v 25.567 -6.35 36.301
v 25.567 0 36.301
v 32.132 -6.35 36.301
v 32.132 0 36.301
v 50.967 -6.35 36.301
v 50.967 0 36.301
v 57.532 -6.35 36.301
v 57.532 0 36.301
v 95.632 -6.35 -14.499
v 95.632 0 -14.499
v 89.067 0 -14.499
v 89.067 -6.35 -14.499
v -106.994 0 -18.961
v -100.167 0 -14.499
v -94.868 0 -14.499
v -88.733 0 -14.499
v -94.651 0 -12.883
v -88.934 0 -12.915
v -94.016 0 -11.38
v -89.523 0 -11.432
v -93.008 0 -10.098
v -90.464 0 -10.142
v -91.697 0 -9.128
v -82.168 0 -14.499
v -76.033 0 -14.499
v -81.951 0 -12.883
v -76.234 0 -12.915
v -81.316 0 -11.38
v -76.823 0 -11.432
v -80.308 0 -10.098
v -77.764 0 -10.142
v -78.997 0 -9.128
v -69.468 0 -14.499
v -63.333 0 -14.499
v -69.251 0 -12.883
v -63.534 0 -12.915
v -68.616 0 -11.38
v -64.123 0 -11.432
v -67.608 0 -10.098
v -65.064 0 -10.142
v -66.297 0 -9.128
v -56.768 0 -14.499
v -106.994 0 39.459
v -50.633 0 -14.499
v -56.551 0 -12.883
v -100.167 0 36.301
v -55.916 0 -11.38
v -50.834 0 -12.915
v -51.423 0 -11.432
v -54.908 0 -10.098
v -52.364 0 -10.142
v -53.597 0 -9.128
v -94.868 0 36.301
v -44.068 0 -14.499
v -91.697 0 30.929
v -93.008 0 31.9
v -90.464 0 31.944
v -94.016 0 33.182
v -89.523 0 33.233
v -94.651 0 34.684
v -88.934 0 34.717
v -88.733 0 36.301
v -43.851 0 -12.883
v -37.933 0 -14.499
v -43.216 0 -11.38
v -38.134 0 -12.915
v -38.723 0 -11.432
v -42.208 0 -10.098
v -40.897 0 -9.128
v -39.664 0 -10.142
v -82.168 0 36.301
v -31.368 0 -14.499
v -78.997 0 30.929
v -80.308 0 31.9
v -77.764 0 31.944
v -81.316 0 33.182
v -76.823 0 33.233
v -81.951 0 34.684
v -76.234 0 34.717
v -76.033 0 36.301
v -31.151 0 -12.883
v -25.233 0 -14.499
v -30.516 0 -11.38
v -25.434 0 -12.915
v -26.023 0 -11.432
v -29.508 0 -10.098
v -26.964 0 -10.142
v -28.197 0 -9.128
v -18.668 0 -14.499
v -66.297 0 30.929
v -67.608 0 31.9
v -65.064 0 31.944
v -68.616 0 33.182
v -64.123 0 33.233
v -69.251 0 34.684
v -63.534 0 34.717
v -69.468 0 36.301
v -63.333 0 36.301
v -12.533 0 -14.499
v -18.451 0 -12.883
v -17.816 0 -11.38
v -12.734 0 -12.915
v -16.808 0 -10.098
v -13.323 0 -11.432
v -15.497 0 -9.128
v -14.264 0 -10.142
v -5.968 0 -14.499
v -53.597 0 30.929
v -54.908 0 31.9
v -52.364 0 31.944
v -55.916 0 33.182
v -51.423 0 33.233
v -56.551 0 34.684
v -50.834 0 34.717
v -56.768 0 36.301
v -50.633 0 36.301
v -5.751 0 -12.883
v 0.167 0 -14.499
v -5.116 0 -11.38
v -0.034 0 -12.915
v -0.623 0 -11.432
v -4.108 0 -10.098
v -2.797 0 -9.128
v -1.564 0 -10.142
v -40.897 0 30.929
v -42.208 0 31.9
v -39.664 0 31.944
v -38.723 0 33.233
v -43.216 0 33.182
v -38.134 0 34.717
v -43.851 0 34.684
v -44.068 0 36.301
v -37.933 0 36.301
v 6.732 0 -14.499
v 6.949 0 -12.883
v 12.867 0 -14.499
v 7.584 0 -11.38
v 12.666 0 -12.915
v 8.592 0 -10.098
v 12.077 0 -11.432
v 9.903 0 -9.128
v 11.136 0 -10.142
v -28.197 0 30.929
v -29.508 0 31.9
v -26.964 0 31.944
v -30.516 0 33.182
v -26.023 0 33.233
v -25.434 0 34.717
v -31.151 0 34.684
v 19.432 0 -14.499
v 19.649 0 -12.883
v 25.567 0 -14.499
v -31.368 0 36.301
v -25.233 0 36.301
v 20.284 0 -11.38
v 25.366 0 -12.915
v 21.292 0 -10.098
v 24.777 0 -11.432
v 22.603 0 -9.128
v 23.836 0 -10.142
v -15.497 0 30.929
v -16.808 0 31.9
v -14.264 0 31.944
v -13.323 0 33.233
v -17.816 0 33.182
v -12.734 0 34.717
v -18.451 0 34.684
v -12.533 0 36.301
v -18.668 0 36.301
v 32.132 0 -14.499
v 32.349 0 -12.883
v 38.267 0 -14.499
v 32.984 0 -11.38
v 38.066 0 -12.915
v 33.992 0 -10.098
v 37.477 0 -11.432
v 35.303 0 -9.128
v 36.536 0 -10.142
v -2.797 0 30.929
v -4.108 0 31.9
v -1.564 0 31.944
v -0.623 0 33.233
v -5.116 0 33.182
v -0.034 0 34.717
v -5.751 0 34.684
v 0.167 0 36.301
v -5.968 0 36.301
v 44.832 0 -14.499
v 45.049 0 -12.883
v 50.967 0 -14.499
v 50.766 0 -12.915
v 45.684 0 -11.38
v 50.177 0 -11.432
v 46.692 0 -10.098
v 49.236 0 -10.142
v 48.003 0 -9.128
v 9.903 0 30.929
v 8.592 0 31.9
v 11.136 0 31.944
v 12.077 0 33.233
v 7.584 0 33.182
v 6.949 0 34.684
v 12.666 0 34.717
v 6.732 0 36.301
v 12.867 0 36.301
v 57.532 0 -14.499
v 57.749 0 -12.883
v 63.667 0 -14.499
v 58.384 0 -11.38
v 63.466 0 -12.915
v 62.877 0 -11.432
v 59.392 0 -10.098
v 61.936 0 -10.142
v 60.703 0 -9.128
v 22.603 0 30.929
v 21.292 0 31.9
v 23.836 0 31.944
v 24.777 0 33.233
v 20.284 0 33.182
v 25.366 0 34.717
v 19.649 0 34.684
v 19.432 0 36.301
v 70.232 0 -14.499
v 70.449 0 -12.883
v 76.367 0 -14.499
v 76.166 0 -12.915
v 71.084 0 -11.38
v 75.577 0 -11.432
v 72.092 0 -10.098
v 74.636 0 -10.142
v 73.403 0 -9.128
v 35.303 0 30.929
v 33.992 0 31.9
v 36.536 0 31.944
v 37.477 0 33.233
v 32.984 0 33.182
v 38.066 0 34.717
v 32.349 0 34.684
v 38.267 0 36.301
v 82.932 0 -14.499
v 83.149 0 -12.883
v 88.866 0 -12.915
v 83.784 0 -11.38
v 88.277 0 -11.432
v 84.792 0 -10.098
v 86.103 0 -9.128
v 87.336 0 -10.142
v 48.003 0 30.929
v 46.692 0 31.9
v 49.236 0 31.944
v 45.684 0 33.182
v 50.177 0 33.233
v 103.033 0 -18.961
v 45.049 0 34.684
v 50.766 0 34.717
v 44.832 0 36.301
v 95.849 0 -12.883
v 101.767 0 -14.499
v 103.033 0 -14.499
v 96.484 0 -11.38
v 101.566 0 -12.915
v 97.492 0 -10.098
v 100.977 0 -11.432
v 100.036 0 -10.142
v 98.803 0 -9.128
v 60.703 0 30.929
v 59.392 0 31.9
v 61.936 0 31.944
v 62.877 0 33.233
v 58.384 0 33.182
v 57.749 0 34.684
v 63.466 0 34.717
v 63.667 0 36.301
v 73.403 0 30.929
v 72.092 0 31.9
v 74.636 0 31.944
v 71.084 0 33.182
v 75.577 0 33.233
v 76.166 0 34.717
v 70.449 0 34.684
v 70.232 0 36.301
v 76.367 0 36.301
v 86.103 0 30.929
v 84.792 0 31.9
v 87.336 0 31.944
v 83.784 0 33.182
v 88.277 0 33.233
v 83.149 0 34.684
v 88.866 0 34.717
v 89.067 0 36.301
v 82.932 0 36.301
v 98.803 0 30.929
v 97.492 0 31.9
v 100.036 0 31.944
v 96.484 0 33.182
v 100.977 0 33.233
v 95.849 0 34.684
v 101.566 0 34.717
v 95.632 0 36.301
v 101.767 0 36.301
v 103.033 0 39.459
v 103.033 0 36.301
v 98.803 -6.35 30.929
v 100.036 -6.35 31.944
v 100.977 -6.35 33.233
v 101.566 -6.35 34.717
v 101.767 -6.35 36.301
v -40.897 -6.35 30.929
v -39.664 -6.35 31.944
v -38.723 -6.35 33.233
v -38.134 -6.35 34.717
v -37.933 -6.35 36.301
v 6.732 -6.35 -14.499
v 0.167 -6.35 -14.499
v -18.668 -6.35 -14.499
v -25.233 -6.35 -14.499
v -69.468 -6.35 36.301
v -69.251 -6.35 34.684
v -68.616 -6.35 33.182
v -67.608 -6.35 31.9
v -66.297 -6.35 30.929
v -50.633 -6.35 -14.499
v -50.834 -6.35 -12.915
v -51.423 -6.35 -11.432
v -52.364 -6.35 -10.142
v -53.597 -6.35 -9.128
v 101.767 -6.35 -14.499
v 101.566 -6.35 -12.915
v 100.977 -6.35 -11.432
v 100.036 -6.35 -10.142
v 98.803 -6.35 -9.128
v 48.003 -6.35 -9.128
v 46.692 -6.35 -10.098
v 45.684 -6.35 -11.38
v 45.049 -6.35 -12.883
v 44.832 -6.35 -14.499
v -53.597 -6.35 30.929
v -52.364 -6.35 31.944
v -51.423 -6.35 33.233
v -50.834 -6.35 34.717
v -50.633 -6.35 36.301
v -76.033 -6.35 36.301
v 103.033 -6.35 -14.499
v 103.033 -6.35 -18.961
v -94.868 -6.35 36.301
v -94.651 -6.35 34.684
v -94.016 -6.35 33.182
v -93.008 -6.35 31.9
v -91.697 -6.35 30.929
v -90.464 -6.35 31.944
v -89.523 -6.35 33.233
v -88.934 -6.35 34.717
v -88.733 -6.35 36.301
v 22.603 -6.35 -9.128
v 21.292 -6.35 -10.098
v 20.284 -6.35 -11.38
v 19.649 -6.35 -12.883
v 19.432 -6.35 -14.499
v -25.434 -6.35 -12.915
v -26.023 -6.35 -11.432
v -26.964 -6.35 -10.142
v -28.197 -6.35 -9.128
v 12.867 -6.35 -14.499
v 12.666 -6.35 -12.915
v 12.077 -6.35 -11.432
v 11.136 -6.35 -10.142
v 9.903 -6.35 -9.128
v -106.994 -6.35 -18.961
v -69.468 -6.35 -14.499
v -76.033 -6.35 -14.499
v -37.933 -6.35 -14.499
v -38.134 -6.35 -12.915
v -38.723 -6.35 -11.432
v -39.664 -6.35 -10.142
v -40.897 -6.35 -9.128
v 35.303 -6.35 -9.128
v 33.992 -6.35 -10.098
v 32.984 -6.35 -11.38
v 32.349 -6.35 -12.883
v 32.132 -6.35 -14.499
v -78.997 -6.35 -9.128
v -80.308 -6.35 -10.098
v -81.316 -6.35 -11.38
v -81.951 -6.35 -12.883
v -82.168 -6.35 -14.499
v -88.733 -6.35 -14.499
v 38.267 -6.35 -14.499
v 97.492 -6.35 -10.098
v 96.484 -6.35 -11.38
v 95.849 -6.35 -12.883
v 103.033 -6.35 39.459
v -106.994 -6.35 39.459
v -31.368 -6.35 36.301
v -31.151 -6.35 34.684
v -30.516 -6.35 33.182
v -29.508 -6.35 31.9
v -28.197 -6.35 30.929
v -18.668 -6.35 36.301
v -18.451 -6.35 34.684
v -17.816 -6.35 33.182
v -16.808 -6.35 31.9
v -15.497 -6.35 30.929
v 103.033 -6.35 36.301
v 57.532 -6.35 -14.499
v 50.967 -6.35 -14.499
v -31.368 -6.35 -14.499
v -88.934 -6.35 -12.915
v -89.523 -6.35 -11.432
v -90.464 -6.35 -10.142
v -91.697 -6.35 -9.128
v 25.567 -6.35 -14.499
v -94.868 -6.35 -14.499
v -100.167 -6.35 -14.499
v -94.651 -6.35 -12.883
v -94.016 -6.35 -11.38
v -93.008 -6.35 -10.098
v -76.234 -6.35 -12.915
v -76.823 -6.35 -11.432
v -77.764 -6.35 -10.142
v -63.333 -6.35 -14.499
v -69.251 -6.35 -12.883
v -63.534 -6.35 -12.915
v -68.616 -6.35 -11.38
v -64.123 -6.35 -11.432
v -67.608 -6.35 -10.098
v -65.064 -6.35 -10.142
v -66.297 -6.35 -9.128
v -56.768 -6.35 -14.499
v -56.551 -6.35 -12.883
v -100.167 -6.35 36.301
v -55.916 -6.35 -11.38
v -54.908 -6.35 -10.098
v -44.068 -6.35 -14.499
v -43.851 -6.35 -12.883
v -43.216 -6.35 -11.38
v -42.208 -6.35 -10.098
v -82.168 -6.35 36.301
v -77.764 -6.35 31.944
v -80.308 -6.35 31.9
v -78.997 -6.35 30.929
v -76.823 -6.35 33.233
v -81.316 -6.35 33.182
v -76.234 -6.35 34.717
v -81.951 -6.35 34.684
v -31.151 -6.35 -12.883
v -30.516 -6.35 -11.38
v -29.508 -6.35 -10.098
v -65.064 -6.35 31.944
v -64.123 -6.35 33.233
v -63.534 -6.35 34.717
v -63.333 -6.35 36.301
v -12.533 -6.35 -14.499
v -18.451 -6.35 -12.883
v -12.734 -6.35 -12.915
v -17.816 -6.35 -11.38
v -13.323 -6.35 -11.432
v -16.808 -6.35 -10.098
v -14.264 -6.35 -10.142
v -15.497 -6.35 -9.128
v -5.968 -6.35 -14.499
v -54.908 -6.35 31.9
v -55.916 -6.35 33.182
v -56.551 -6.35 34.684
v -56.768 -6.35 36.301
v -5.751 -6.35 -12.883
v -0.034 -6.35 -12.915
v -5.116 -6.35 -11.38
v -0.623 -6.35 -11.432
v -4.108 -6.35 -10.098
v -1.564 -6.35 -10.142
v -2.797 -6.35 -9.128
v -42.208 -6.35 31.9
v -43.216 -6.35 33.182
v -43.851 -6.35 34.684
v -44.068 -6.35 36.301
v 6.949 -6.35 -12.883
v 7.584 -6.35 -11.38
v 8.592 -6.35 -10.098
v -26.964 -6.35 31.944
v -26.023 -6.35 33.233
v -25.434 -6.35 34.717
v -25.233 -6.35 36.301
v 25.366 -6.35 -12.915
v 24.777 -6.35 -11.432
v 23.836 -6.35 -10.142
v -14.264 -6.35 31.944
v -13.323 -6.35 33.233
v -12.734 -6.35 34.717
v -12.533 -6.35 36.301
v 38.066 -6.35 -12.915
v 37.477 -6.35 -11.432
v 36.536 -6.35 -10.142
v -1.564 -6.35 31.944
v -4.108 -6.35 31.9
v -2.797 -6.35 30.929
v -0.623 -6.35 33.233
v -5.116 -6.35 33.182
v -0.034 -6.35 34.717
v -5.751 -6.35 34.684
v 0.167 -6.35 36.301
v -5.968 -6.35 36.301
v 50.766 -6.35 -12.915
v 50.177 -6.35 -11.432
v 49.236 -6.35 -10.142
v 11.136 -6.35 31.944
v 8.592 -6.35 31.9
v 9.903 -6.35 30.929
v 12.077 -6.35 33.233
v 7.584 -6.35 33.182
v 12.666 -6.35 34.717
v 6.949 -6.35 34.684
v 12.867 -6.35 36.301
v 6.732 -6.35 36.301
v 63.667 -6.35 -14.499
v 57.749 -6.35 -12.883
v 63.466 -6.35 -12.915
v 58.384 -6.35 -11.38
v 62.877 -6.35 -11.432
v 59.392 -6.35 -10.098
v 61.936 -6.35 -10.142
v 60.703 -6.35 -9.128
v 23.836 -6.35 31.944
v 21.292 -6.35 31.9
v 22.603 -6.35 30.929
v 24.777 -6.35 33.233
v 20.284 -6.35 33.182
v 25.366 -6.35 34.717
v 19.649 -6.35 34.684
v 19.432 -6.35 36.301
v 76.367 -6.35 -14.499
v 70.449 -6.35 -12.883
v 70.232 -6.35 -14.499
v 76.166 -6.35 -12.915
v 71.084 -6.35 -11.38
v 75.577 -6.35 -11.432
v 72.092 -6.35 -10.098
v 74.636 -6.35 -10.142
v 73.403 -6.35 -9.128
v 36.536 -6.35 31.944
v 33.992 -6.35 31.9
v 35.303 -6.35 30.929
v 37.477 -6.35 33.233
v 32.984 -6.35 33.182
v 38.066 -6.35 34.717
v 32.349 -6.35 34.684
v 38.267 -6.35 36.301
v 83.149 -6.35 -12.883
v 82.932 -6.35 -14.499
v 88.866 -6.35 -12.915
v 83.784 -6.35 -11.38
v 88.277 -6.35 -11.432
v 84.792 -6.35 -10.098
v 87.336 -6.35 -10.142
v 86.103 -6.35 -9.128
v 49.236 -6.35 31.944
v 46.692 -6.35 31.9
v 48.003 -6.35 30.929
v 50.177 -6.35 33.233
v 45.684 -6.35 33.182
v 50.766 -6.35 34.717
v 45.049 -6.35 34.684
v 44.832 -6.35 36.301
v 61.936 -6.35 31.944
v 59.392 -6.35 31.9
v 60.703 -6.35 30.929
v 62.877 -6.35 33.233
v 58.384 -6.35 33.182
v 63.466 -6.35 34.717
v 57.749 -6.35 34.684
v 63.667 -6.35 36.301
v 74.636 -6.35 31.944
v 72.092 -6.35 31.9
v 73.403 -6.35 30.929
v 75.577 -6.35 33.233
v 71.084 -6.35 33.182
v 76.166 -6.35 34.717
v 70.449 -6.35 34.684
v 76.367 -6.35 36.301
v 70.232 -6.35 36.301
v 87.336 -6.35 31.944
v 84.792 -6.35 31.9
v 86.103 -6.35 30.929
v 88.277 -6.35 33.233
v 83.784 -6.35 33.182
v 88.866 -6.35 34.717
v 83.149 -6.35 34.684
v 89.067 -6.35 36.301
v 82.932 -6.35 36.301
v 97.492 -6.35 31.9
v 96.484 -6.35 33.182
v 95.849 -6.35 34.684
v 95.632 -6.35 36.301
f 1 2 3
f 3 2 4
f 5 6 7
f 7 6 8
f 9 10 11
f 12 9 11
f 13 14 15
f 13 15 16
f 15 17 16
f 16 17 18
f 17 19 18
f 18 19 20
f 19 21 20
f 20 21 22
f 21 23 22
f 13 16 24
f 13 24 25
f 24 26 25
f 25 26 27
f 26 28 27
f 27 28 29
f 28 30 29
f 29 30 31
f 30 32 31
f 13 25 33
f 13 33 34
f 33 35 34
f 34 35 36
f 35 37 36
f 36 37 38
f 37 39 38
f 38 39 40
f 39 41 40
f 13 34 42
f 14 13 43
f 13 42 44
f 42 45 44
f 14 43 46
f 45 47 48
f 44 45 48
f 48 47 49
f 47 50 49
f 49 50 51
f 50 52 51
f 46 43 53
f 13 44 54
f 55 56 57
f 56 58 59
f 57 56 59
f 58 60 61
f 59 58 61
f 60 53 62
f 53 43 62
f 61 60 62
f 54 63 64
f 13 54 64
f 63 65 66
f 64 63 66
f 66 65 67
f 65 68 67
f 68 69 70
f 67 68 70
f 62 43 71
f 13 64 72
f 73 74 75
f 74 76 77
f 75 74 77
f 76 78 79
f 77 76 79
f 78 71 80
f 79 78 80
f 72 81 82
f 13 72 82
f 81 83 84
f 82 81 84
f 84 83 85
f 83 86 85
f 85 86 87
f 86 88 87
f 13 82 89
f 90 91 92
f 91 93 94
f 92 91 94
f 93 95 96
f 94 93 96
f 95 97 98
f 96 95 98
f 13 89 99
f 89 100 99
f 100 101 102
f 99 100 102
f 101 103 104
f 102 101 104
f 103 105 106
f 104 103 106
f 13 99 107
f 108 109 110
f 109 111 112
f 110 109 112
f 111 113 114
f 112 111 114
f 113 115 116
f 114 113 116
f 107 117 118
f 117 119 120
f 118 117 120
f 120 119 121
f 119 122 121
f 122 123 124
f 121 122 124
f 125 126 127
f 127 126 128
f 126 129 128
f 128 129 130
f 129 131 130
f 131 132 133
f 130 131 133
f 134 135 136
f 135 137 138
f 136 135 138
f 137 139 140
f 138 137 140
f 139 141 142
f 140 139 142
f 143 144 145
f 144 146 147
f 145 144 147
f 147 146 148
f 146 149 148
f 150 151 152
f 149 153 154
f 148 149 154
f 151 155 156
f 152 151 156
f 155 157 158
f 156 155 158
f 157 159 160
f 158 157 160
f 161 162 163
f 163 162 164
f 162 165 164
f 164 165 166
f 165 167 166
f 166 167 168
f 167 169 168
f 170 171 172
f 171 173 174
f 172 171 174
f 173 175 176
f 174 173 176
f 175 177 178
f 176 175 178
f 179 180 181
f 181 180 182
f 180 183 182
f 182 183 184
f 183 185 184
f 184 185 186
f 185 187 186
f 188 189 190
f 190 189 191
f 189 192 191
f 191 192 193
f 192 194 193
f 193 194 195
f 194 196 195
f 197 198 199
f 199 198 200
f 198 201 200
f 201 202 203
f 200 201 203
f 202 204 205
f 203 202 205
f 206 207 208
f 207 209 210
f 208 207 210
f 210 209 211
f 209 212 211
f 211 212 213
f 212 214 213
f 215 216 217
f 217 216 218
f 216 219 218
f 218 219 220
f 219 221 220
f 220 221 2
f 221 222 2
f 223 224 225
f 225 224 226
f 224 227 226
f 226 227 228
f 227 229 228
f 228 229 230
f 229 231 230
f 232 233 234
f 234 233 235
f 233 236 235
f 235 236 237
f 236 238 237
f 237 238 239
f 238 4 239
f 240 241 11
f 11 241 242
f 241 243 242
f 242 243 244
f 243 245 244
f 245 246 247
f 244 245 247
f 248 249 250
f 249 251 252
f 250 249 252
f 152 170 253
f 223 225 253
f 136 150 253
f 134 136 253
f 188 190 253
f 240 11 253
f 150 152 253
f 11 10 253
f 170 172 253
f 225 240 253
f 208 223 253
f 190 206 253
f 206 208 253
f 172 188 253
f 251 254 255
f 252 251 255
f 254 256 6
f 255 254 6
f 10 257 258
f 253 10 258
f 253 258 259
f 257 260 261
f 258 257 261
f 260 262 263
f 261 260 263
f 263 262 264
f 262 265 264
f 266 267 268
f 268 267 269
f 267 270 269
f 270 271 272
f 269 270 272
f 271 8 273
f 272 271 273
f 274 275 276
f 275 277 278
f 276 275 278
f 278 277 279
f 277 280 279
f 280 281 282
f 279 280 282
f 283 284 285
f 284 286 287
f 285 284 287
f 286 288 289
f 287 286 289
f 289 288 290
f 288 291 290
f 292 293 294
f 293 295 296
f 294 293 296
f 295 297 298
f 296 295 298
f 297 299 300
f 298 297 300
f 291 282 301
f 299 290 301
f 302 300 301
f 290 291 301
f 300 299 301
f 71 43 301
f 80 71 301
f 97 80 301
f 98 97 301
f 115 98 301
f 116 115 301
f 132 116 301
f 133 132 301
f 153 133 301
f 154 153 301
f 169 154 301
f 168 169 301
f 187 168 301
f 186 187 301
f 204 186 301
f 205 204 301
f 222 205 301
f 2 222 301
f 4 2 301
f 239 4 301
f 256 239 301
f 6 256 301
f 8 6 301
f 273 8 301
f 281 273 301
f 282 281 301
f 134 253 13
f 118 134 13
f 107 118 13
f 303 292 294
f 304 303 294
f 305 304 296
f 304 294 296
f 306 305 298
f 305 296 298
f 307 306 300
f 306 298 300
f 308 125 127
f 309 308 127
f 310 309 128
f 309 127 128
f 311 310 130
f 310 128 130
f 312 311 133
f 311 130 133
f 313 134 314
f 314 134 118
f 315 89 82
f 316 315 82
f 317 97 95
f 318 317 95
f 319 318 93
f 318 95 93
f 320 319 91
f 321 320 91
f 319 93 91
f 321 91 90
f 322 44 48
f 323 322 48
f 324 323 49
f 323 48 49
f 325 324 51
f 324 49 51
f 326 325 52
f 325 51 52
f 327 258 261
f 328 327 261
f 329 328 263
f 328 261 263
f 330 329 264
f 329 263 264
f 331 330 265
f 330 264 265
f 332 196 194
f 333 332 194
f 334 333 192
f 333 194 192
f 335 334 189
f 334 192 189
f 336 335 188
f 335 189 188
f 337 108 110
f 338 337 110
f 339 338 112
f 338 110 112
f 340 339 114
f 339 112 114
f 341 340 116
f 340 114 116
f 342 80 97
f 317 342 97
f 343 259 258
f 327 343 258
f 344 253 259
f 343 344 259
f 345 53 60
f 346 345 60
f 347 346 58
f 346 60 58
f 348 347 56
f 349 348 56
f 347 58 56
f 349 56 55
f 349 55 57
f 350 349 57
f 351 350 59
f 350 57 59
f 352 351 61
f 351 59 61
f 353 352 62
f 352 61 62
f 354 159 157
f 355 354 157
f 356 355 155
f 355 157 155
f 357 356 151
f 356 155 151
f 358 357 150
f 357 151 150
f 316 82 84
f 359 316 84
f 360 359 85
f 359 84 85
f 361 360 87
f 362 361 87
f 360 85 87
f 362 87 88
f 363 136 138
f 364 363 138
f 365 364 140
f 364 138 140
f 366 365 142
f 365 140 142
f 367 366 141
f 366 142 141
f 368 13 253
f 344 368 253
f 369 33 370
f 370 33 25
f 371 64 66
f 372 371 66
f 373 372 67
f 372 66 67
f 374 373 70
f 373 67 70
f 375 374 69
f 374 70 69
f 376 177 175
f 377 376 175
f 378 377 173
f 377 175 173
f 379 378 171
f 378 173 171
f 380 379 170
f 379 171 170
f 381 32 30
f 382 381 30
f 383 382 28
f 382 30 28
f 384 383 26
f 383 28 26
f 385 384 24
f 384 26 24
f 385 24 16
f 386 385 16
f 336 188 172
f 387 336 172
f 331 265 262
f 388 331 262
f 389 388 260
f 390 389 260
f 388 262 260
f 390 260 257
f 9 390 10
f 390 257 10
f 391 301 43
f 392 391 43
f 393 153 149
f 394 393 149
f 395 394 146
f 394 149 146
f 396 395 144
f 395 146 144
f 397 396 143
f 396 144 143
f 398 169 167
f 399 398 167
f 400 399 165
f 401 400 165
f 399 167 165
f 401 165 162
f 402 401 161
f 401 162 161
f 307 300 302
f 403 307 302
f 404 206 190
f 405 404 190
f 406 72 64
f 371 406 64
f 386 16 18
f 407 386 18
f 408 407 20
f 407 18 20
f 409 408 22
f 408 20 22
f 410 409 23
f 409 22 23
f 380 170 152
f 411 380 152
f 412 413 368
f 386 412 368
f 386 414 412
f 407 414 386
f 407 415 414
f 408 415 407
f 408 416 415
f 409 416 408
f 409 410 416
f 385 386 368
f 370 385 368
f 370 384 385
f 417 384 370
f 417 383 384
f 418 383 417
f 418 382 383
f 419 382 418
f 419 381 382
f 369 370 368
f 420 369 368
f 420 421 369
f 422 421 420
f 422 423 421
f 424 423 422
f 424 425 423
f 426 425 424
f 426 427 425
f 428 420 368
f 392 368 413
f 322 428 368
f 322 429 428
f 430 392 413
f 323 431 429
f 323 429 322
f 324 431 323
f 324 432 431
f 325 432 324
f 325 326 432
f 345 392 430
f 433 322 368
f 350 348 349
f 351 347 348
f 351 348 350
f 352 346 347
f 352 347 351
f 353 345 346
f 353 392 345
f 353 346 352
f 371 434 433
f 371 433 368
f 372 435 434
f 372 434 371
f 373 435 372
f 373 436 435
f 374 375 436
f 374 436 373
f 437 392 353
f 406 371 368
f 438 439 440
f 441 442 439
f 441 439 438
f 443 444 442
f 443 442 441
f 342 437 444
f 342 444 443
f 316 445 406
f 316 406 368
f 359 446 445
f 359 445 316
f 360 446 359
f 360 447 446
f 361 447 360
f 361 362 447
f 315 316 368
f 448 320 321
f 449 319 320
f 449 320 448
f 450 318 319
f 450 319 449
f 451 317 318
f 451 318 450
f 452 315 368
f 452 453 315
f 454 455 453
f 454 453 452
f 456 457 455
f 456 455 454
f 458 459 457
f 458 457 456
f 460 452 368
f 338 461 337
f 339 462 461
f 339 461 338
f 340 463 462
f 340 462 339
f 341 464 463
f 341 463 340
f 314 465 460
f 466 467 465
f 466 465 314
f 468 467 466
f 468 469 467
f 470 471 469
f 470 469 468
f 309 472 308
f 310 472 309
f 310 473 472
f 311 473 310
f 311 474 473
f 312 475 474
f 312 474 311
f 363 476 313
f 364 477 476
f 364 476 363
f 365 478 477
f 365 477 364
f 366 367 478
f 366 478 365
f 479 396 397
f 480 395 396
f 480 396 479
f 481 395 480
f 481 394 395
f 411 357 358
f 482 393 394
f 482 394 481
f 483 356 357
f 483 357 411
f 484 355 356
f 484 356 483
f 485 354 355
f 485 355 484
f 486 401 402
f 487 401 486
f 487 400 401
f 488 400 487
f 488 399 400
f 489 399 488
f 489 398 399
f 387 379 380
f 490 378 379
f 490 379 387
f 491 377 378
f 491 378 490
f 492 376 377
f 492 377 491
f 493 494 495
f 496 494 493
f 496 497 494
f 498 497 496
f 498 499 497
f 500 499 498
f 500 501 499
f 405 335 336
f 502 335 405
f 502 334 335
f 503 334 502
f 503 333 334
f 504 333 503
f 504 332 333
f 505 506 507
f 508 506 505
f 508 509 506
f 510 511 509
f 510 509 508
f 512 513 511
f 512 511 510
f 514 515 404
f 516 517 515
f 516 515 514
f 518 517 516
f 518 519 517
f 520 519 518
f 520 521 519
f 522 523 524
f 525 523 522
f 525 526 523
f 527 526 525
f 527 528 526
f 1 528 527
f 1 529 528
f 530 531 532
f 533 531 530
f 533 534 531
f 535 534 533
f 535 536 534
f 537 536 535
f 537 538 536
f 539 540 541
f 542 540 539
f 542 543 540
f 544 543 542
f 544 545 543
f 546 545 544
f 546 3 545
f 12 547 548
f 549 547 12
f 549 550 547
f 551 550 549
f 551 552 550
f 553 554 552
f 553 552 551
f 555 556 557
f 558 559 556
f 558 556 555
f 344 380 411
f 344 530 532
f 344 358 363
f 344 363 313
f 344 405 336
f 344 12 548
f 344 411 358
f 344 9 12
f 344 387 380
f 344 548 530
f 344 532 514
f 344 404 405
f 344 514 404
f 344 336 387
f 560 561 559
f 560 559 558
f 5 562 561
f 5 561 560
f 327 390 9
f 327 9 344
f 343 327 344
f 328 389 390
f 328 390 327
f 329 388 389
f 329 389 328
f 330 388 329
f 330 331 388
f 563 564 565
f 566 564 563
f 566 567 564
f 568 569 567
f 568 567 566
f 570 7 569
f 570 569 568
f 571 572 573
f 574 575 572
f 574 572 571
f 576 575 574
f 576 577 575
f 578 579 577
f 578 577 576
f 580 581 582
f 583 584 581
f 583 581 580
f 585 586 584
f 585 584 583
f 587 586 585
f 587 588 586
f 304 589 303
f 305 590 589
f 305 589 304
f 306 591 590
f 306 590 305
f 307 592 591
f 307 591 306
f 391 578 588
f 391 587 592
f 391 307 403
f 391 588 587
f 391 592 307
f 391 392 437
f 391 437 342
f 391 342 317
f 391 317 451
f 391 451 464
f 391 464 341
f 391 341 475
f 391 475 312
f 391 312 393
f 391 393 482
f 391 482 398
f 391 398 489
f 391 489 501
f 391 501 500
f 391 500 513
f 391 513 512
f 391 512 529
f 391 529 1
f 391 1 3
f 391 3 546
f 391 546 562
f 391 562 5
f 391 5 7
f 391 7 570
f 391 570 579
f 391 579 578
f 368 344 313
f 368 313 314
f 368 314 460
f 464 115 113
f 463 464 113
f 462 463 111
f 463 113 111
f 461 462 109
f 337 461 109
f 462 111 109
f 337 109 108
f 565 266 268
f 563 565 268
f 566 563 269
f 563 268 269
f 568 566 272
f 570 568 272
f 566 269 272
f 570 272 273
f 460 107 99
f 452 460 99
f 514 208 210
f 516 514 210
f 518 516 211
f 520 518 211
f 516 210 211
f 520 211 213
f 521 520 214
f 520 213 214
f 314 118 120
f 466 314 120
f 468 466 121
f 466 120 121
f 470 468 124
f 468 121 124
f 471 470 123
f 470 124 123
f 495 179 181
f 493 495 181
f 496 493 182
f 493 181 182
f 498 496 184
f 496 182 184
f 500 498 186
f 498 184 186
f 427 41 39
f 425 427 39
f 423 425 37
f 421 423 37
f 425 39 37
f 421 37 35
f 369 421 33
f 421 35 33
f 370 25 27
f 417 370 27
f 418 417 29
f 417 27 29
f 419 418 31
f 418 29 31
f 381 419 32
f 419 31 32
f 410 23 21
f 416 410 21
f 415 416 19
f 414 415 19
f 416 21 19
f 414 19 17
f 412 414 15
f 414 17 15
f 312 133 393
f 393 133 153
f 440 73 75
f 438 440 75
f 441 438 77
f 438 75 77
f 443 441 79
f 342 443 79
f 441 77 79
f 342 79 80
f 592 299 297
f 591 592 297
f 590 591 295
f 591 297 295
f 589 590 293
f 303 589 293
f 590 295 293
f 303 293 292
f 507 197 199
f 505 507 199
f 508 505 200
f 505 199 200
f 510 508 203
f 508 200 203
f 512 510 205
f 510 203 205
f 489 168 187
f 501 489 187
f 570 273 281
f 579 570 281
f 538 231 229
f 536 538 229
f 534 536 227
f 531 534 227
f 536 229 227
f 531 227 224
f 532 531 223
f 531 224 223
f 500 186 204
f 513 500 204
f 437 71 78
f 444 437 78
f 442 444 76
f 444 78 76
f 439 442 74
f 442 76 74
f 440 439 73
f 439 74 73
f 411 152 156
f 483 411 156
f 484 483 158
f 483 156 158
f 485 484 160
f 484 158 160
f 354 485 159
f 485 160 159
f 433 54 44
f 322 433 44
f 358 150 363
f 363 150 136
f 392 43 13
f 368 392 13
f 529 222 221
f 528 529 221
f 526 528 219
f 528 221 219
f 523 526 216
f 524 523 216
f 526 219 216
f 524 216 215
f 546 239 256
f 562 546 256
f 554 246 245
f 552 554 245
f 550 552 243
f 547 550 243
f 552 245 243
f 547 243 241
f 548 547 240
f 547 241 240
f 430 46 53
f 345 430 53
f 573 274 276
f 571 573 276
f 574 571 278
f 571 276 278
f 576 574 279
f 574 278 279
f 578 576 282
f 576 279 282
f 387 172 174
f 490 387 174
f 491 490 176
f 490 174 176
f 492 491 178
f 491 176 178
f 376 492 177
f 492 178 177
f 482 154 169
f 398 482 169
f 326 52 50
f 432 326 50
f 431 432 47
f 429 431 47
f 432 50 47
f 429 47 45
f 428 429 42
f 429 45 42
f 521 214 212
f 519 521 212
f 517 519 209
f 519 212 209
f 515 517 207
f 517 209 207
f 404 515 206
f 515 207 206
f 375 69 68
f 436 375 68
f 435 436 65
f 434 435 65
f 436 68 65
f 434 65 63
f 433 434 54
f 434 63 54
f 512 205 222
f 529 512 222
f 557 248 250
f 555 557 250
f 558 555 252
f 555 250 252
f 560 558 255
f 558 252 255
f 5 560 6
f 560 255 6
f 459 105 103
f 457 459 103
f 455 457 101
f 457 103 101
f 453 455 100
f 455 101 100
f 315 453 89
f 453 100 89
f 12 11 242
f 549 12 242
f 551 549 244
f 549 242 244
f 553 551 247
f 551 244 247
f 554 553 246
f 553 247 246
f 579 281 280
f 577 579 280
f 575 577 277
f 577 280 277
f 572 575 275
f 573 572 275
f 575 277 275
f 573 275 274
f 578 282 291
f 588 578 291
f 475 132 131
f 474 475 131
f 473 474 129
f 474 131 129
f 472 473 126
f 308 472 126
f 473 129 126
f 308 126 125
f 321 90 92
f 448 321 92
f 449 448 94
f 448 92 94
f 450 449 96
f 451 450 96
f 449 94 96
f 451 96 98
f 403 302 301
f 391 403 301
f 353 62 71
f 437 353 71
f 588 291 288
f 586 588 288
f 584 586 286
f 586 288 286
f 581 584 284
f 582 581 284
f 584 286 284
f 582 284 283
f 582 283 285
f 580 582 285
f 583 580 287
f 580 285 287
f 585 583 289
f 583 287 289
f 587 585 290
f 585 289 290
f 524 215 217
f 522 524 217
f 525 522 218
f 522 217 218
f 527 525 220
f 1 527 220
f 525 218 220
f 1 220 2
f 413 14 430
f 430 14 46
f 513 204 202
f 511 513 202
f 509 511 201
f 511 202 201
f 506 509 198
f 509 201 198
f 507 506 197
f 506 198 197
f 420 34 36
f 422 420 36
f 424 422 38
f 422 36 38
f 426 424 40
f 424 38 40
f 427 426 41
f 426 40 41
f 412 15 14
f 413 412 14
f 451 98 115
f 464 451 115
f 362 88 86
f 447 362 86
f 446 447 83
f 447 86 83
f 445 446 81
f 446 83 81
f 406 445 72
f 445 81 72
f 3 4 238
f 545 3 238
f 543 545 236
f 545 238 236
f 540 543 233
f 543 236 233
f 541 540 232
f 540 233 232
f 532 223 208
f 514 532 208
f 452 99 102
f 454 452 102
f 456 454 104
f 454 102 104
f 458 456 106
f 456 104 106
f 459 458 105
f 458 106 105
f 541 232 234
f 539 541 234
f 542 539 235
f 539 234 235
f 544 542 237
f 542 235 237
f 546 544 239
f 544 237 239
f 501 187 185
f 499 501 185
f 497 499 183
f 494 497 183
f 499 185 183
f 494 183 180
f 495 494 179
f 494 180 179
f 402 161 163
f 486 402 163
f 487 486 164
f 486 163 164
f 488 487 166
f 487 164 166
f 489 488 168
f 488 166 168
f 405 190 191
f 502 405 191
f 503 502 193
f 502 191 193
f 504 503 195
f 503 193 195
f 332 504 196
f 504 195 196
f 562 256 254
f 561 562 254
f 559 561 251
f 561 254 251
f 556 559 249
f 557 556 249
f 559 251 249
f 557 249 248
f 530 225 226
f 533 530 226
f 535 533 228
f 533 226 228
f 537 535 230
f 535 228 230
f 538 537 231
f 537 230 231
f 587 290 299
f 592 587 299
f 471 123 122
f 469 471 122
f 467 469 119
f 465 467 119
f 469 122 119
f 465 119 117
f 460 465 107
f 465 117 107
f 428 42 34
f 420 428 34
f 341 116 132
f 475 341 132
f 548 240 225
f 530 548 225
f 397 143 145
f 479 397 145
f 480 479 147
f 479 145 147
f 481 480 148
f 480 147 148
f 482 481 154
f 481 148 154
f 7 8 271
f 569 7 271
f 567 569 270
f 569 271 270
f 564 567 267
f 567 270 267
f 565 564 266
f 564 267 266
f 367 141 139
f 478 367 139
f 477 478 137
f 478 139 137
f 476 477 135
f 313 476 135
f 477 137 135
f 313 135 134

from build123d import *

# Parameters (mm, degrees)
F1_DEPTH = 6.35


with BuildPart() as f1:
    # F0 (on Front) → F1 (new body)
    with BuildSketch(Plane.XZ):
        Polygon((-100.167322, -14.499216), (-100.167322, 36.300784), (-94.868163, 36.300784), (-88.733239, 36.300784), (-82.168163, 36.300784), (-76.033239, 36.300784), (-69.468163, 36.300784), (-63.333239, 36.300784), (-56.768163, 36.300784), (-50.633239, 36.300784), (-44.068163, 36.300784), (-37.933239, 36.300784), (-31.368163, 36.300784), (-25.233239, 36.300784), (-18.668163, 36.300784), (-12.533239, 36.300784), (-5.968163, 36.300784), (0.166761, 36.300784), (6.731837, 36.300784), (12.866761, 36.300784), (19.431837, 36.300784), (25.566761, 36.300784), (32.131837, 36.300784), (38.266761, 36.300784), (44.831837, 36.300784), (50.966761, 36.300784), (57.531837, 36.300784), (63.666761, 36.300784), (70.231837, 36.300784), (76.366761, 36.300784), (82.931837, 36.300784), (89.066761, 36.300784), (95.631837, 36.300784), (101.766761, 36.300784), (103.032678, 36.300784), (103.032678, 39.458872), (-106.993854, 39.458872), (-106.993854, -18.961128), (103.032678, -18.961128), (103.032678, -14.499216), (101.766761, -14.499216), (95.631837, -14.499216), (89.066761, -14.499216), (82.931837, -14.499216), (76.366761, -14.499216), (70.231837, -14.499216), (63.666761, -14.499216), (57.531837, -14.499216), (50.966761, -14.499216), (44.831837, -14.499216), (38.266761, -14.499216), (32.131837, -14.499216), (25.566761, -14.499216), (19.431837, -14.499216), (12.866761, -14.499216), (6.731837, -14.499216), (0.166761, -14.499216), (-5.968163, -14.499216), (-12.533239, -14.499216), (-18.668163, -14.499216), (-25.233239, -14.499216), (-31.368163, -14.499216), (-37.933239, -14.499216), (-44.068163, -14.499216), (-50.633239, -14.499216), (-56.768163, -14.499216), (-63.333239, -14.499216), (-69.468163, -14.499216), (-76.033239, -14.499216), (-82.168163, -14.499216), (-88.733239, -14.499216), (-94.868163, -14.499216), align=None)
        with BuildLine():
            Line((-88.733239, 36.300784), (-94.868163, 36.300784))
            ThreePointArc((-94.868163, 36.300784), (-94.016162, 33.181807), (-91.696805, 30.92914))
            ThreePointArc((-91.696805, 30.92914), (-89.523277, 33.233322), (-88.733239, 36.300784))
        make_face()
        with BuildLine():
            Line((-76.033239, 36.300784), (-82.168163, 36.300784))
            ThreePointArc((-82.168163, 36.300784), (-81.316162, 33.181807), (-78.996805, 30.92914))
            ThreePointArc((-78.996805, 30.92914), (-76.823277, 33.233322), (-76.033239, 36.300784))
        make_face()
        with BuildLine():
            Line((-63.333239, 36.300784), (-69.468163, 36.300784))
            ThreePointArc((-69.468163, 36.300784), (-68.616162, 33.181807), (-66.296805, 30.92914))
            ThreePointArc((-66.296805, 30.92914), (-64.123277, 33.233322), (-63.333239, 36.300784))
        make_face()
        with BuildLine():
            Line((-50.633239, 36.300784), (-56.768163, 36.300784))
            ThreePointArc((-56.768163, 36.300784), (-55.916162, 33.181807), (-53.596805, 30.92914))
            ThreePointArc((-53.596805, 30.92914), (-51.423277, 33.233322), (-50.633239, 36.300784))
        make_face()
        with BuildLine():
            Line((-37.933239, 36.300784), (-44.068163, 36.300784))
            ThreePointArc((-44.068163, 36.300784), (-43.216162, 33.181807), (-40.896805, 30.92914))
            ThreePointArc((-40.896805, 30.92914), (-38.723277, 33.233322), (-37.933239, 36.300784))
        make_face()
        with BuildLine():
            Line((-25.233239, 36.300784), (-31.368163, 36.300784))
            ThreePointArc((-31.368163, 36.300784), (-30.516162, 33.181807), (-28.196805, 30.92914))
            ThreePointArc((-28.196805, 30.92914), (-26.023277, 33.233322), (-25.233239, 36.300784))
        make_face()
        with BuildLine():
            Line((-12.533239, 36.300784), (-18.668163, 36.300784))
            ThreePointArc((-18.668163, 36.300784), (-17.816162, 33.181807), (-15.496805, 30.92914))
            ThreePointArc((-15.496805, 30.92914), (-13.323277, 33.233322), (-12.533239, 36.300784))
        make_face()
        with BuildLine():
            Line((0.166761, 36.300784), (-5.968163, 36.300784))
            ThreePointArc((-5.968163, 36.300784), (-5.116162, 33.181807), (-2.796805, 30.92914))
            ThreePointArc((-2.796805, 30.92914), (-0.623277, 33.233322), (0.166761, 36.300784))
        make_face()
        with BuildLine():
            Line((12.866761, 36.300784), (6.731837, 36.300784))
            ThreePointArc((6.731837, 36.300784), (7.583838, 33.181807), (9.903195, 30.92914))
            ThreePointArc((9.903195, 30.92914), (12.076723, 33.233322), (12.866761, 36.300784))
        make_face()
        with BuildLine():
            Line((25.566761, 36.300784), (19.431837, 36.300784))
            ThreePointArc((19.431837, 36.300784), (20.283838, 33.181807), (22.603195, 30.92914))
            ThreePointArc((22.603195, 30.92914), (24.776723, 33.233322), (25.566761, 36.300784))
        make_face()
        with BuildLine():
            Line((38.266761, 36.300784), (32.131837, 36.300784))
            ThreePointArc((32.131837, 36.300784), (32.983838, 33.181807), (35.303195, 30.92914))
            ThreePointArc((35.303195, 30.92914), (37.476723, 33.233322), (38.266761, 36.300784))
        make_face()
        with BuildLine():
            Line((50.966761, 36.300784), (44.831837, 36.300784))
            ThreePointArc((44.831837, 36.300784), (45.683838, 33.181807), (48.003195, 30.92914))
            ThreePointArc((48.003195, 30.92914), (50.176723, 33.233322), (50.966761, 36.300784))
        make_face()
        with BuildLine():
            Line((63.666761, 36.300784), (57.531837, 36.300784))
            ThreePointArc((57.531837, 36.300784), (58.383838, 33.181807), (60.703195, 30.92914))
            ThreePointArc((60.703195, 30.92914), (62.876723, 33.233322), (63.666761, 36.300784))
        make_face()
        with BuildLine():
            Line((76.366761, 36.300784), (70.231837, 36.300784))
            ThreePointArc((70.231837, 36.300784), (71.083838, 33.181807), (73.403195, 30.92914))
            ThreePointArc((73.403195, 30.92914), (75.576723, 33.233322), (76.366761, 36.300784))
        make_face()
        with BuildLine():
            Line((89.066761, 36.300784), (82.931837, 36.300784))
            ThreePointArc((82.931837, 36.300784), (83.783838, 33.181807), (86.103195, 30.92914))
            ThreePointArc((86.103195, 30.92914), (88.276723, 33.233322), (89.066761, 36.300784))
        make_face()
        with BuildLine():
            Line((101.766761, 36.300784), (95.631837, 36.300784))
            ThreePointArc((95.631837, 36.300784), (96.483838, 33.181807), (98.803195, 30.92914))
            ThreePointArc((98.803195, 30.92914), (100.976723, 33.233322), (101.766761, 36.300784))
        make_face()
        with BuildLine():
            ThreePointArc((98.803195, -9.127571), (96.483838, -11.380239), (95.631837, -14.499216))
            Line((95.631837, -14.499216), (101.766761, -14.499216))
            ThreePointArc((101.766761, -14.499216), (100.976723, -11.431754), (98.803195, -9.127571))
        make_face()
        with BuildLine():
            ThreePointArc((86.103195, -9.127571), (83.783838, -11.380239), (82.931837, -14.499216))
            Line((82.931837, -14.499216), (89.066761, -14.499216))
            ThreePointArc((89.066761, -14.499216), (88.276723, -11.431754), (86.103195, -9.127571))
        make_face()
        with BuildLine():
            ThreePointArc((73.403195, -9.127571), (71.083838, -11.380239), (70.231837, -14.499216))
            Line((70.231837, -14.499216), (76.366761, -14.499216))
            ThreePointArc((76.366761, -14.499216), (75.576723, -11.431754), (73.403195, -9.127571))
        make_face()
        with BuildLine():
            ThreePointArc((60.703195, -9.127571), (58.383838, -11.380239), (57.531837, -14.499216))
            Line((57.531837, -14.499216), (63.666761, -14.499216))
            ThreePointArc((63.666761, -14.499216), (62.876723, -11.431754), (60.703195, -9.127571))
        make_face()
        with BuildLine():
            ThreePointArc((48.003195, -9.127571), (45.683838, -11.380239), (44.831837, -14.499216))
            Line((44.831837, -14.499216), (50.966761, -14.499216))
            ThreePointArc((50.966761, -14.499216), (50.176723, -11.431754), (48.003195, -9.127571))
        make_face()
        with BuildLine():
            ThreePointArc((35.303195, -9.127571), (32.983838, -11.380239), (32.131837, -14.499216))
            Line((32.131837, -14.499216), (38.266761, -14.499216))
            ThreePointArc((38.266761, -14.499216), (37.476723, -11.431754), (35.303195, -9.127571))
        make_face()
        with BuildLine():
            ThreePointArc((22.603195, -9.127571), (20.283838, -11.380239), (19.431837, -14.499216))
            Line((19.431837, -14.499216), (25.566761, -14.499216))
            ThreePointArc((25.566761, -14.499216), (24.776723, -11.431754), (22.603195, -9.127571))
        make_face()
        with BuildLine():
            ThreePointArc((9.903195, -9.127571), (7.583838, -11.380239), (6.731837, -14.499216))
            Line((6.731837, -14.499216), (12.866761, -14.499216))
            ThreePointArc((12.866761, -14.499216), (12.076723, -11.431754), (9.903195, -9.127571))
        make_face()
        with BuildLine():
            ThreePointArc((-2.796805, -9.127571), (-5.116162, -11.380239), (-5.968163, -14.499216))
            Line((-5.968163, -14.499216), (0.166761, -14.499216))
            ThreePointArc((0.166761, -14.499216), (-0.623277, -11.431754), (-2.796805, -9.127571))
        make_face()
        with BuildLine():
            ThreePointArc((-15.496805, -9.127571), (-17.816162, -11.380239), (-18.668163, -14.499216))
            Line((-18.668163, -14.499216), (-12.533239, -14.499216))
            ThreePointArc((-12.533239, -14.499216), (-13.323277, -11.431754), (-15.496805, -9.127571))
        make_face()
        with BuildLine():
            ThreePointArc((-28.196805, -9.127571), (-30.516162, -11.380239), (-31.368163, -14.499216))
            Line((-31.368163, -14.499216), (-25.233239, -14.499216))
            ThreePointArc((-25.233239, -14.499216), (-26.023277, -11.431754), (-28.196805, -9.127571))
        make_face()
        with BuildLine():
            ThreePointArc((-40.896805, -9.127571), (-43.216162, -11.380239), (-44.068163, -14.499216))
            Line((-44.068163, -14.499216), (-37.933239, -14.499216))
            ThreePointArc((-37.933239, -14.499216), (-38.723277, -11.431754), (-40.896805, -9.127571))
        make_face()
        with BuildLine():
            ThreePointArc((-53.596805, -9.127571), (-55.916162, -11.380239), (-56.768163, -14.499216))
            Line((-56.768163, -14.499216), (-50.633239, -14.499216))
            ThreePointArc((-50.633239, -14.499216), (-51.423277, -11.431754), (-53.596805, -9.127571))
        make_face()
        with BuildLine():
            ThreePointArc((-66.296805, -9.127571), (-68.616162, -11.380239), (-69.468163, -14.499216))
            Line((-69.468163, -14.499216), (-63.333239, -14.499216))
            ThreePointArc((-63.333239, -14.499216), (-64.123277, -11.431754), (-66.296805, -9.127571))
        make_face()
        with BuildLine():
            ThreePointArc((-78.996805, -9.127571), (-81.316162, -11.380239), (-82.168163, -14.499216))
            Line((-82.168163, -14.499216), (-76.033239, -14.499216))
            ThreePointArc((-76.033239, -14.499216), (-76.823277, -11.431754), (-78.996805, -9.127571))
        make_face()
        with BuildLine():
            ThreePointArc((-91.696805, -9.127571), (-94.016162, -11.380239), (-94.868163, -14.499216))
            Line((-94.868163, -14.499216), (-88.733239, -14.499216))
            ThreePointArc((-88.733239, -14.499216), (-89.523277, -11.431754), (-91.696805, -9.127571))
        make_face()
    extrude(amount=F1_DEPTH)


solid = f1.part
